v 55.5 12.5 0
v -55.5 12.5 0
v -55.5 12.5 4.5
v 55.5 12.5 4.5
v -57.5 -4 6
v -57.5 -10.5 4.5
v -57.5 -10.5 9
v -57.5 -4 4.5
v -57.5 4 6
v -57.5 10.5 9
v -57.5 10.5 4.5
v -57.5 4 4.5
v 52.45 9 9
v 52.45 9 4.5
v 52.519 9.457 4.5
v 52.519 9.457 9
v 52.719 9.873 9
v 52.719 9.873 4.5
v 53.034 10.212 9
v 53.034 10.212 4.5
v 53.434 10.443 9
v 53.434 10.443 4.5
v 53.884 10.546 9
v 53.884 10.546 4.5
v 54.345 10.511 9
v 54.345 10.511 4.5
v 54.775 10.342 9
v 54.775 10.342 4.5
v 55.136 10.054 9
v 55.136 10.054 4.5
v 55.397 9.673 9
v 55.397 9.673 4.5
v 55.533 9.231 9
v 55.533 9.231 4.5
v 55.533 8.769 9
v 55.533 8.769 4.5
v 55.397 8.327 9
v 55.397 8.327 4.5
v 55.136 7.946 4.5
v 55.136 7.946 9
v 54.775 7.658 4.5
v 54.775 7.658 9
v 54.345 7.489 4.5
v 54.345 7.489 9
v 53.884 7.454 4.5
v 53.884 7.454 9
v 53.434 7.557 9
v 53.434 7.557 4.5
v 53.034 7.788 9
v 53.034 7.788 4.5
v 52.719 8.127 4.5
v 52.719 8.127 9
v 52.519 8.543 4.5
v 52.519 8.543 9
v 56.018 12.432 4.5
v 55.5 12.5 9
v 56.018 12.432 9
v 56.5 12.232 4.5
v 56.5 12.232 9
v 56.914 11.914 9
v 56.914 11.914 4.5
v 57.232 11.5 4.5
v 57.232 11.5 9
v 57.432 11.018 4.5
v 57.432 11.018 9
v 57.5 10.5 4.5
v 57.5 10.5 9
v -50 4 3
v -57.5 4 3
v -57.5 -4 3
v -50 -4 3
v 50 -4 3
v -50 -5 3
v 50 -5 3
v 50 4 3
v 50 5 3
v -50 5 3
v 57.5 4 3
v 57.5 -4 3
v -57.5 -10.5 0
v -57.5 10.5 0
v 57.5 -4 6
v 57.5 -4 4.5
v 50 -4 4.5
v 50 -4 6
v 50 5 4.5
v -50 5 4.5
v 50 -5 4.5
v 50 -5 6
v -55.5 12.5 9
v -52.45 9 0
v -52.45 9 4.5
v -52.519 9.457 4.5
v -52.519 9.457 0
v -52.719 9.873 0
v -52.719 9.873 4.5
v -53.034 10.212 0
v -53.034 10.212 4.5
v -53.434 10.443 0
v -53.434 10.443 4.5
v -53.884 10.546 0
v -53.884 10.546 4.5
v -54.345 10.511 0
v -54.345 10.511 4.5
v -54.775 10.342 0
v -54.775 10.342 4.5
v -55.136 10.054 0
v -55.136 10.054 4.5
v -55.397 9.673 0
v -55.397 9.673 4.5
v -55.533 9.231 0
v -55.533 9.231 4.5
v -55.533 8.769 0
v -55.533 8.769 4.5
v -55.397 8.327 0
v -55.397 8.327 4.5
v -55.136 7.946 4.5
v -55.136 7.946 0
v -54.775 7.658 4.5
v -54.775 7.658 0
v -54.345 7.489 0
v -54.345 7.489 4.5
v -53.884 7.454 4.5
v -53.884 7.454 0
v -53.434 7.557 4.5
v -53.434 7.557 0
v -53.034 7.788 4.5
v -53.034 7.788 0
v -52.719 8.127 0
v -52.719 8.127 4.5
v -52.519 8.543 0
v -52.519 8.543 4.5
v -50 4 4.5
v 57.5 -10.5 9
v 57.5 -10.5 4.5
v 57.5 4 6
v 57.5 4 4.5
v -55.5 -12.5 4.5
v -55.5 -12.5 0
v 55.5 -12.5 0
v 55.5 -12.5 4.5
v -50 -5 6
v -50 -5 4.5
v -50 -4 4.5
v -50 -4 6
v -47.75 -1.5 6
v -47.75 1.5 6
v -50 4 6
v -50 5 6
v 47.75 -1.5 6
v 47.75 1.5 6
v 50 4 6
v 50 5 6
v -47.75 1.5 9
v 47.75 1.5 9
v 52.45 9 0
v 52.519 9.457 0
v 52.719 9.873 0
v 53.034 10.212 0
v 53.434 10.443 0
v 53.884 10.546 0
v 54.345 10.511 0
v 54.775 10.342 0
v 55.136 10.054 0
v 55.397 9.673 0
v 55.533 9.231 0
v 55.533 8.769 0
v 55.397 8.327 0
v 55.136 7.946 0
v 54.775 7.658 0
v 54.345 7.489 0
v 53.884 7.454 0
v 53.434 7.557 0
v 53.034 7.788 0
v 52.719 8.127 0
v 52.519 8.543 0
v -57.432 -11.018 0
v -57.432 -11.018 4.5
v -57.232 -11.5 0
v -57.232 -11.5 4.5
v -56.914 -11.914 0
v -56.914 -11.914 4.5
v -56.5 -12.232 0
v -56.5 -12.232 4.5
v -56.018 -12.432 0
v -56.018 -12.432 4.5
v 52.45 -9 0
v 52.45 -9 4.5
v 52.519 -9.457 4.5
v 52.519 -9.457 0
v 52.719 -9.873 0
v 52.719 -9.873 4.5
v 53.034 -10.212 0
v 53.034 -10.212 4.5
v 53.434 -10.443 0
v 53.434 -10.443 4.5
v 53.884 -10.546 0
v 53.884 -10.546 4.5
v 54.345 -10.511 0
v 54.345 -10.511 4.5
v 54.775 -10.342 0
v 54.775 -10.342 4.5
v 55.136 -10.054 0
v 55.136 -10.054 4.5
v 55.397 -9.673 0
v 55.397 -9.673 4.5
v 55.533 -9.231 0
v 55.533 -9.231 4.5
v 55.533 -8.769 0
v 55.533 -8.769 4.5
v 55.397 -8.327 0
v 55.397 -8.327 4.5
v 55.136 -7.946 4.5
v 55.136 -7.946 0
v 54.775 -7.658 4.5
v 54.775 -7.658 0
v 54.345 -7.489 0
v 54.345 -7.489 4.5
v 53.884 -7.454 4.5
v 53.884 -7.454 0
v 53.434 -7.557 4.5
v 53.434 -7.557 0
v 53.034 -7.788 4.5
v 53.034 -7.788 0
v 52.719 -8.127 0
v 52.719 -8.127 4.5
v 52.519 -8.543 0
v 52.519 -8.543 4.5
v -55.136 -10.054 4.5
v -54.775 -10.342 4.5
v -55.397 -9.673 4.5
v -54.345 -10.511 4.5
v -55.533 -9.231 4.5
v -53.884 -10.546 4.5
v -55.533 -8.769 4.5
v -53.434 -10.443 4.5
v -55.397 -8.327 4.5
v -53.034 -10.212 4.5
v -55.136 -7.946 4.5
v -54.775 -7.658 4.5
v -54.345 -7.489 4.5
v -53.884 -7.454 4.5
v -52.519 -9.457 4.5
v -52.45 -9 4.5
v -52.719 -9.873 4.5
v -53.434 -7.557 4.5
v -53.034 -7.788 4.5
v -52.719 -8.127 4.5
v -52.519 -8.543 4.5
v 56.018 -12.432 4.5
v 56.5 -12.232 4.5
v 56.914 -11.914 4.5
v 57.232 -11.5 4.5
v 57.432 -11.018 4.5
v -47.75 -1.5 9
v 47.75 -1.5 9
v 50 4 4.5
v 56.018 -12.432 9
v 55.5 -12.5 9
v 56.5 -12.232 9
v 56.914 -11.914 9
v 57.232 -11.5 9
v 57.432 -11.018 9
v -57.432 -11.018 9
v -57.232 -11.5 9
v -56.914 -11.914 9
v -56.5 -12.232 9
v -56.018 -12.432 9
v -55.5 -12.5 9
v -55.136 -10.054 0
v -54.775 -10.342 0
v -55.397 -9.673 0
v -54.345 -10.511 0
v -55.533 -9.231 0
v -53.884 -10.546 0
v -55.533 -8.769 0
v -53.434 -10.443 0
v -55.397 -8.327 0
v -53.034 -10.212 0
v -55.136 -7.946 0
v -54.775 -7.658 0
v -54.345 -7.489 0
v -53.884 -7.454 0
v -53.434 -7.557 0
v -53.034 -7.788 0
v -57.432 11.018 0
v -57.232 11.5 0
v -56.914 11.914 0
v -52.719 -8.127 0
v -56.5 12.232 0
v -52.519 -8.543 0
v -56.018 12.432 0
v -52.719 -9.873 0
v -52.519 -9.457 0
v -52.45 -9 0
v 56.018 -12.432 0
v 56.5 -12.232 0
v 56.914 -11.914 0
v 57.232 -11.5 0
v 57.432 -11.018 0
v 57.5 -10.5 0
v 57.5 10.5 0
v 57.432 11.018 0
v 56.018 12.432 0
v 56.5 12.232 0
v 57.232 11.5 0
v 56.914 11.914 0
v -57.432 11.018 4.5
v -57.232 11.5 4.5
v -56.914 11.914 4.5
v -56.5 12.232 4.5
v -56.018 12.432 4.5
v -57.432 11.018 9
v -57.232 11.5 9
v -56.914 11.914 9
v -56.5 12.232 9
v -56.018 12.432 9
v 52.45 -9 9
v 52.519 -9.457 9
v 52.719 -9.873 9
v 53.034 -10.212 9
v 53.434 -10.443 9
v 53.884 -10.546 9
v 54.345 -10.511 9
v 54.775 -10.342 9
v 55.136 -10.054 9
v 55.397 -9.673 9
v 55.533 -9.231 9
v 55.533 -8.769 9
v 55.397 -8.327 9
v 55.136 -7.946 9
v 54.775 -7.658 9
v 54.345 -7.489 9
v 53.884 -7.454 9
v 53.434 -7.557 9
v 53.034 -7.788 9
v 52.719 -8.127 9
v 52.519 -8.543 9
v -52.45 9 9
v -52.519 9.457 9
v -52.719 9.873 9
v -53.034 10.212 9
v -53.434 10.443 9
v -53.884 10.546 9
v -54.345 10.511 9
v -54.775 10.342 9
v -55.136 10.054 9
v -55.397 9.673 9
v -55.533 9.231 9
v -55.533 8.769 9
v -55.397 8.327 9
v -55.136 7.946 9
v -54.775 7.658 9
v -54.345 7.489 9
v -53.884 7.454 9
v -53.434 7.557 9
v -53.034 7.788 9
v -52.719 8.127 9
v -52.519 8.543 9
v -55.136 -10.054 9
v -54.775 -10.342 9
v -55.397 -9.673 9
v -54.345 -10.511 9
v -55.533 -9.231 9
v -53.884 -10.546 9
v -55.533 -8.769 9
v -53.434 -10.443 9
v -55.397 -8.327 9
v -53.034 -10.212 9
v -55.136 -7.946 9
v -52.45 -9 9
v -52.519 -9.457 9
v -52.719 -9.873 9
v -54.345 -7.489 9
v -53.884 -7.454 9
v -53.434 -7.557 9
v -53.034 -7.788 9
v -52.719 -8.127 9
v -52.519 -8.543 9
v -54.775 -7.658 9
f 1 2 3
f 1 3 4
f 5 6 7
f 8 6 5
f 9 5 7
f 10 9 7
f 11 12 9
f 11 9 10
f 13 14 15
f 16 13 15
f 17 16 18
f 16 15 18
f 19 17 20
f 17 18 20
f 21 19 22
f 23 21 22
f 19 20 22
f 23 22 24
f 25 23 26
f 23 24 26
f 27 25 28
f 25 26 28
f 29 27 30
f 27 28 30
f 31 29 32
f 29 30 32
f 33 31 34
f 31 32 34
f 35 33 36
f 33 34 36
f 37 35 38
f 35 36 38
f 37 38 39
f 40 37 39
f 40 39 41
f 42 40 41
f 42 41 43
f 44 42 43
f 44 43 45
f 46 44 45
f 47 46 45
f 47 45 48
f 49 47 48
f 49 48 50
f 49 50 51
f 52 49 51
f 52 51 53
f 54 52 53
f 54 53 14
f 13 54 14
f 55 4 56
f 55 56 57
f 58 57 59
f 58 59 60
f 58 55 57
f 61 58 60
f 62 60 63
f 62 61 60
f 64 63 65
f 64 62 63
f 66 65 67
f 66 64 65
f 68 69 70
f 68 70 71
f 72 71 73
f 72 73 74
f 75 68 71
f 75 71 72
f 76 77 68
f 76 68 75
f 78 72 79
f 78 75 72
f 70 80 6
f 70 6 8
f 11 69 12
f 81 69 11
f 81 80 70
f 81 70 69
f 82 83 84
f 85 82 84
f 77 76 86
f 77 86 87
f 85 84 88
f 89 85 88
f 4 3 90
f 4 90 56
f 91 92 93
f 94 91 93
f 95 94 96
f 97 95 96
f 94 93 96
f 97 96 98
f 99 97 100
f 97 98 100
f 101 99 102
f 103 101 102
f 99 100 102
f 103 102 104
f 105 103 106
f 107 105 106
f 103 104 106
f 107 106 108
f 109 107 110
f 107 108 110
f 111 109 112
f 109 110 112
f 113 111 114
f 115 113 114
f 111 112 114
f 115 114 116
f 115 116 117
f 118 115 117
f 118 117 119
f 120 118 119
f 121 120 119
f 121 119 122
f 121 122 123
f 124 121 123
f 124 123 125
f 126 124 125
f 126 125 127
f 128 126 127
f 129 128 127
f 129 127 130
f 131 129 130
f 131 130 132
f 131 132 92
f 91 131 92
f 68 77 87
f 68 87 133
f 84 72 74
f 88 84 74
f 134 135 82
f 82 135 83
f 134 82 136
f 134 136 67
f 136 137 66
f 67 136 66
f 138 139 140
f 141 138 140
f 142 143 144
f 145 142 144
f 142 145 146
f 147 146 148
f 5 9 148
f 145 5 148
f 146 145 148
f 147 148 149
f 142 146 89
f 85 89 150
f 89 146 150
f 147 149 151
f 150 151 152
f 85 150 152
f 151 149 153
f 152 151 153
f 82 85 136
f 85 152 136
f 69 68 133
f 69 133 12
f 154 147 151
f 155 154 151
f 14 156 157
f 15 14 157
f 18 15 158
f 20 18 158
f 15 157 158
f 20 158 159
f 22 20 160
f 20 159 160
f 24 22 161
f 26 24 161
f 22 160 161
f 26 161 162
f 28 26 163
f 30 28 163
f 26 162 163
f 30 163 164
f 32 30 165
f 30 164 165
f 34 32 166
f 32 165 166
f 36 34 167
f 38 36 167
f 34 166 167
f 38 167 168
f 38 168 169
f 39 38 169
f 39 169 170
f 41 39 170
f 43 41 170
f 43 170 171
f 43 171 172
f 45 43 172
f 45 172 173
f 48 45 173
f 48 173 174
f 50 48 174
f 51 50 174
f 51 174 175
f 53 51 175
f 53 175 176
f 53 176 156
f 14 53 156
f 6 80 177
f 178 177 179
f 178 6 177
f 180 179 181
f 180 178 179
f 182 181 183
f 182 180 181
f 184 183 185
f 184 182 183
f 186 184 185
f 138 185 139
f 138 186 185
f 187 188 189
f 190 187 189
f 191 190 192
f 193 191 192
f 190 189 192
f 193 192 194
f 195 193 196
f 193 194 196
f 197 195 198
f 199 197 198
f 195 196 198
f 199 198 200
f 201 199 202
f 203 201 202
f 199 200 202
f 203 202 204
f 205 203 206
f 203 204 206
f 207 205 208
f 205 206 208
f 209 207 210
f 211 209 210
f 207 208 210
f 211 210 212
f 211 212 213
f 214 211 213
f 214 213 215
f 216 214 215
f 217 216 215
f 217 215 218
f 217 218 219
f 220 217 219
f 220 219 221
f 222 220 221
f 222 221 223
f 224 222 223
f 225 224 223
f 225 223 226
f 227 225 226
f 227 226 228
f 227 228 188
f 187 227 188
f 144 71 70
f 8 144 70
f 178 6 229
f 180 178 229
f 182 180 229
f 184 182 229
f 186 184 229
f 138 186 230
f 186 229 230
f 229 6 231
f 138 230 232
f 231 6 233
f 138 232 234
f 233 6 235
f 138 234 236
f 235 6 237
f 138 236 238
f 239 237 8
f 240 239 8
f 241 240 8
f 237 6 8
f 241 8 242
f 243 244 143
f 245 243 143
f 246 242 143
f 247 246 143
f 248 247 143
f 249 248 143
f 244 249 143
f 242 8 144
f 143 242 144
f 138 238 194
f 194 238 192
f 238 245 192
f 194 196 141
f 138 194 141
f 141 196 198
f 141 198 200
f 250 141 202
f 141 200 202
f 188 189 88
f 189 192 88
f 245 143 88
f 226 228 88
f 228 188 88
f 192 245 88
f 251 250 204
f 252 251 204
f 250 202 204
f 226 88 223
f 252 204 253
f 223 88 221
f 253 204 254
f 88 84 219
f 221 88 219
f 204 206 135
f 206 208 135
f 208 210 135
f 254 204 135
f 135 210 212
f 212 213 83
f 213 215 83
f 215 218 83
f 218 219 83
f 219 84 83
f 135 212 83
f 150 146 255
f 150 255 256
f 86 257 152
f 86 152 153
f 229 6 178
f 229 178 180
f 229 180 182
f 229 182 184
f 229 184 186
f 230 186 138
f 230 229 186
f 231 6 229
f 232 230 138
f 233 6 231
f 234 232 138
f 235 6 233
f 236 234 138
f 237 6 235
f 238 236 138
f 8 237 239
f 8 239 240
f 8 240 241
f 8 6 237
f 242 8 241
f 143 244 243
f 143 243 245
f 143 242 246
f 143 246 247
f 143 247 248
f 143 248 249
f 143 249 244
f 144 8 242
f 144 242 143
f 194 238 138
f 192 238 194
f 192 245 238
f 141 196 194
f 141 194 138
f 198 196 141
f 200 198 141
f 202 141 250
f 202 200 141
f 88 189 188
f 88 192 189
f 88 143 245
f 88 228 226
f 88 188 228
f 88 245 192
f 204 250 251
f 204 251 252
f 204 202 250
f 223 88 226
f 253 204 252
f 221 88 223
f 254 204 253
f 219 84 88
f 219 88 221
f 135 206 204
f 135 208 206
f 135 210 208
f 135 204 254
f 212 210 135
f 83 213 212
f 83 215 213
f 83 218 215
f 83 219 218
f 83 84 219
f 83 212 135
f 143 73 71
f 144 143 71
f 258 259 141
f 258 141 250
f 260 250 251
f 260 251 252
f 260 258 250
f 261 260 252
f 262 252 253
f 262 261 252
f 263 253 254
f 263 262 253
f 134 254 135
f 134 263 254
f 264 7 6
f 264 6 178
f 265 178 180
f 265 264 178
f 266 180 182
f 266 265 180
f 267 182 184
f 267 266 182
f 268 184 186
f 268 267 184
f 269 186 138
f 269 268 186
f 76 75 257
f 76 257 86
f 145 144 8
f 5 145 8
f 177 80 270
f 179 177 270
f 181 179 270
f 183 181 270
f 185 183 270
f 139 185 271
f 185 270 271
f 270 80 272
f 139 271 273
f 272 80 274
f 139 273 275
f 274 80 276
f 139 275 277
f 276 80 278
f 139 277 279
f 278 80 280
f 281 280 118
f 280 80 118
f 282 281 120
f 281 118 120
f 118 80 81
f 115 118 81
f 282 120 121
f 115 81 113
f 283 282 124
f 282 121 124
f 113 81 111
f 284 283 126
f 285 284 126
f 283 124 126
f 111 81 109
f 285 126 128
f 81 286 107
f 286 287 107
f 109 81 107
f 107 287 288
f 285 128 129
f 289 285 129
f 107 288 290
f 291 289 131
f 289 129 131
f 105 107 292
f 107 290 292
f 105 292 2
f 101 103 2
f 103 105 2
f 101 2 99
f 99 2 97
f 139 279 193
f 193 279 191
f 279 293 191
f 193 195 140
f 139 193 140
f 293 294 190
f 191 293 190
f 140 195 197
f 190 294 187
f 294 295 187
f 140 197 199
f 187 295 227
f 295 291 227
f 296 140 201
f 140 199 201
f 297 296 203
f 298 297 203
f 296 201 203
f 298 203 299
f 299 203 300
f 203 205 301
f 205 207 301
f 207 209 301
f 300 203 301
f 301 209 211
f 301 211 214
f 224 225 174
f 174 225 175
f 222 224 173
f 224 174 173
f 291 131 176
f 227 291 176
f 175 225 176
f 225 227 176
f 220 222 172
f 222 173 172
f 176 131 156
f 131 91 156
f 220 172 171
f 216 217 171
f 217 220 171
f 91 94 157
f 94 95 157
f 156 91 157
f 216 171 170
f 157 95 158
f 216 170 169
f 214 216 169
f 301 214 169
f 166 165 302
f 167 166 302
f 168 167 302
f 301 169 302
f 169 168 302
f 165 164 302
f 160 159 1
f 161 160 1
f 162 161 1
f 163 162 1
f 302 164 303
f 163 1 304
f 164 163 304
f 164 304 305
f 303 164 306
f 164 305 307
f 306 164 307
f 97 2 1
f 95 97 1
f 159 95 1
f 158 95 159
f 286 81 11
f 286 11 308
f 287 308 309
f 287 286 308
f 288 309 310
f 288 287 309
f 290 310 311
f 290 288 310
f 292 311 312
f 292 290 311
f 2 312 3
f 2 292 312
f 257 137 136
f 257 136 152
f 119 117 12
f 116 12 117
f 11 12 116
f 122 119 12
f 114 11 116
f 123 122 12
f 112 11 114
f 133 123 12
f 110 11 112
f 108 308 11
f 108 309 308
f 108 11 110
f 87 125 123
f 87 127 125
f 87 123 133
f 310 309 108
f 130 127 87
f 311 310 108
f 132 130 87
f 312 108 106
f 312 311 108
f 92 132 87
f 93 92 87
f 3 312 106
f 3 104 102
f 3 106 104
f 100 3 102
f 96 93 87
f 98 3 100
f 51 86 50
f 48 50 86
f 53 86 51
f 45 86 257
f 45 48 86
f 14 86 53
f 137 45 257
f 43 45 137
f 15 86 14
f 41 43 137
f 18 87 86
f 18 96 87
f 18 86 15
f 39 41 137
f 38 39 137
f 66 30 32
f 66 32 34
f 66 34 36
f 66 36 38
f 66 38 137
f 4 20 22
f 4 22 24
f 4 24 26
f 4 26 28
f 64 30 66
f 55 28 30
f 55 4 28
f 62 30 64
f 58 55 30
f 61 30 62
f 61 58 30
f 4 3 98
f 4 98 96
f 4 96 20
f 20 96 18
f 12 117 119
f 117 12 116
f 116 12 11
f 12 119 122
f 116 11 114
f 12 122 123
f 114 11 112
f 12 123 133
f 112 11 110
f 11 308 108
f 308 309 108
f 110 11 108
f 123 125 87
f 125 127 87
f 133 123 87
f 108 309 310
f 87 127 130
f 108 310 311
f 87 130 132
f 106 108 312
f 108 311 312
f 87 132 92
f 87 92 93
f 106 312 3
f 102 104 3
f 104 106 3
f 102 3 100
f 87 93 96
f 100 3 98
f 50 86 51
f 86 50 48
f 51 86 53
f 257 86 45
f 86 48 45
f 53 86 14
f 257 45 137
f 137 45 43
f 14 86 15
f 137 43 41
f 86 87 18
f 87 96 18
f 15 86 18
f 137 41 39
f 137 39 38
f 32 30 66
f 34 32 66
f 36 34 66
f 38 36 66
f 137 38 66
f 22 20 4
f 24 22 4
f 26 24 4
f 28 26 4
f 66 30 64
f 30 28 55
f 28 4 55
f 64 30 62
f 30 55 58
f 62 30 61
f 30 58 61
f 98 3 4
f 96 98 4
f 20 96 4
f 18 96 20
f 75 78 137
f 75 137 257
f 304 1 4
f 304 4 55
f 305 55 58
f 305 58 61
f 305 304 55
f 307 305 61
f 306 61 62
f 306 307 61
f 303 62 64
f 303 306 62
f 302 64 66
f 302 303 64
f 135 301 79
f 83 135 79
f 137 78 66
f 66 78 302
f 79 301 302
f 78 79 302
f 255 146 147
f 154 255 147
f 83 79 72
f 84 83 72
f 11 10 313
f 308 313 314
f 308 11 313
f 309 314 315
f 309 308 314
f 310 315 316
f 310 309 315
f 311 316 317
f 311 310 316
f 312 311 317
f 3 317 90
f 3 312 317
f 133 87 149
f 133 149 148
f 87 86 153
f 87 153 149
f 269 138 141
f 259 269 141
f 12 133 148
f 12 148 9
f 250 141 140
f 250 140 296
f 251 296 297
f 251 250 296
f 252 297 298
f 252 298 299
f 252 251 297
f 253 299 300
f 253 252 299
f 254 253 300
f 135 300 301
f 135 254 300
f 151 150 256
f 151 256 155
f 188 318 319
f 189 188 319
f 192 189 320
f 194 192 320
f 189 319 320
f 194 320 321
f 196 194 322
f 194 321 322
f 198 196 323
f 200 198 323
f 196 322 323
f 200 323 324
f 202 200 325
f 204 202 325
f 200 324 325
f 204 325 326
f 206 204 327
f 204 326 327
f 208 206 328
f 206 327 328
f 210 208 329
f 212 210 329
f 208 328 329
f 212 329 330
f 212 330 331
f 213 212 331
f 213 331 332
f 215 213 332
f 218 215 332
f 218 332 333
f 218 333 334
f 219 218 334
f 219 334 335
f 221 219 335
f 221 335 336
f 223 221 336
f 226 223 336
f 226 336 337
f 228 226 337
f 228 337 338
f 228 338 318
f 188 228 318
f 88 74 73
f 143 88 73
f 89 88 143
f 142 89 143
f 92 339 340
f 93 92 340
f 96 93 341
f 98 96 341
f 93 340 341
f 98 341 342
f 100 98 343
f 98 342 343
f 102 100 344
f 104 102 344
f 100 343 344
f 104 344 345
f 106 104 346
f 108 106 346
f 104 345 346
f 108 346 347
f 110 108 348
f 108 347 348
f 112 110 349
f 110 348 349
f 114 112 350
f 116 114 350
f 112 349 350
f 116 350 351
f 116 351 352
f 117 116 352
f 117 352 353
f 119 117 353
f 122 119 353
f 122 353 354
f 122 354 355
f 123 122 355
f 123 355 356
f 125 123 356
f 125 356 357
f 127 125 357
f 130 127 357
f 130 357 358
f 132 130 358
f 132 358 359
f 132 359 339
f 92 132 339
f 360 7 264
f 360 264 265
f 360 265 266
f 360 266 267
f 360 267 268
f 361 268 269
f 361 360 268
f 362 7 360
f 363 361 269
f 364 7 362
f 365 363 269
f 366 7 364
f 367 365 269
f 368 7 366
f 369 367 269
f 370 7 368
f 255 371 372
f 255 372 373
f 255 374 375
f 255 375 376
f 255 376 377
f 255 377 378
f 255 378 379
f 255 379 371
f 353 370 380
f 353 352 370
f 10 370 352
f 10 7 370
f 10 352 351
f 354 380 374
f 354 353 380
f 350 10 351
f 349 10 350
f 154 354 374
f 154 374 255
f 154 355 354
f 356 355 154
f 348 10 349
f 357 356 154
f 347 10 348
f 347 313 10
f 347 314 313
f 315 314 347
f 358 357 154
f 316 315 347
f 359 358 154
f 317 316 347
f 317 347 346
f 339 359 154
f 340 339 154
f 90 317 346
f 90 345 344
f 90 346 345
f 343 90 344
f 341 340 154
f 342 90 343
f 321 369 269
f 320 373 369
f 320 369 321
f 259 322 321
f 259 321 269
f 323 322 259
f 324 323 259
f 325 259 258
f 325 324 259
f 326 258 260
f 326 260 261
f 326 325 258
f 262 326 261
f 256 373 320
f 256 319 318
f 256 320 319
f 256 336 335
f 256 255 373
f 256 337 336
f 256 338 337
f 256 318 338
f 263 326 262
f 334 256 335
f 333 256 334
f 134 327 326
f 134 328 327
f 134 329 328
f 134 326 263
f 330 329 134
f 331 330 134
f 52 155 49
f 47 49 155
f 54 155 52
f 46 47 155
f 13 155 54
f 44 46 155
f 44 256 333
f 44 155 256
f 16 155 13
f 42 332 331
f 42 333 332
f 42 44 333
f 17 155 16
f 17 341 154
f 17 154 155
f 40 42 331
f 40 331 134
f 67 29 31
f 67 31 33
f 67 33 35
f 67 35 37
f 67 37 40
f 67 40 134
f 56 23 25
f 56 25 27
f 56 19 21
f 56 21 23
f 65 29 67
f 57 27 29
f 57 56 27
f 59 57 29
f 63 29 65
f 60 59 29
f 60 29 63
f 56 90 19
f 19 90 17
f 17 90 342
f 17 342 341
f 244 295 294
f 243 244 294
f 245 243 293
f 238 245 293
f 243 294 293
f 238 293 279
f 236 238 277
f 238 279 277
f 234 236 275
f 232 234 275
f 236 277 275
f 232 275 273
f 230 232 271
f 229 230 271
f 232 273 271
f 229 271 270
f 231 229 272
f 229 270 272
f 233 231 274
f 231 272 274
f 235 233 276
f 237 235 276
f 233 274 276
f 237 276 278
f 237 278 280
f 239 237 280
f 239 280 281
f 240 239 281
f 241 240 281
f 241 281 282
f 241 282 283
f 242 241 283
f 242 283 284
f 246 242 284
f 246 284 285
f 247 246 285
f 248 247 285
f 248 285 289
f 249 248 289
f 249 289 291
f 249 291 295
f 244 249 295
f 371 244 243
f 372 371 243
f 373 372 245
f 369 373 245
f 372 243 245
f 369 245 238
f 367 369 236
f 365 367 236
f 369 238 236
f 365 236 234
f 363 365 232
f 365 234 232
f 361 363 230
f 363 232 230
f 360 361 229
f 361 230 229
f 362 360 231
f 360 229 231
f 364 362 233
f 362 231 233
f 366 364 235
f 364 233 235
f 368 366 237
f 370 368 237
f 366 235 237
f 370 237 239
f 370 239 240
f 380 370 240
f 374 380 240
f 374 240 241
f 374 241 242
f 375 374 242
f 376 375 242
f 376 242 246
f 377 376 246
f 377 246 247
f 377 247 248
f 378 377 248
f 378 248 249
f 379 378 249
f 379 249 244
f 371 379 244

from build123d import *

# Parameters (mm, degrees)
BOX_BOTTOM_HALF_0_W     = 117
BOX_BOTTOM_HALF_0_H     = 27
BOX_BOTTOM_HALF_0_DEPTH = 5.5
SKETCH_W                = 115
SKETCH_H                = 25
PAD_DEPTH               = 3
PAD001_DEPTH            = 3
SKETCH002_W             = 115
SKETCH002_H             = 25
SKETCH002_W_2           = 95.5
SKETCH002_H_2           = 3
PAD002_DEPTH            = 3
SKETCH003_R             = 1.55
POCKET_DEPTH            = 245.060315
POLARPATTERN_COUNT      = 2
POLARPATTERN001_COUNT   = 2
POLARPATTERN002_COUNT   = 2
FILLET_R                = 2


with BuildPart() as box_bottom_half_0_body:
    # box_bottom_half_0 → box_bottom_half_0 (new body)
    with BuildSketch(Plane(origin=(-58.5, -13.5, -1), x_dir=(1, 0, 0), z_dir=(0, 0, 1))):
        with Locations((58.5, 13.5)):
            Rectangle(BOX_BOTTOM_HALF_0_W, BOX_BOTTOM_HALF_0_H)
    extrude(amount=BOX_BOTTOM_HALF_0_DEPTH)


with BuildPart() as body:
    # Sketch → Pad (new body)
    with BuildSketch(Plane.XY):
        Rectangle(SKETCH_W, SKETCH_H)
    extrude(amount=PAD_DEPTH)

    # Sketch001 (on Face6 of Pad) → Pad001 (join)
    with BuildSketch(Plane.XY.offset(3)):
        Polygon((-57.5, 12.5), (57.5, 12.5), (57.5, 4), (50, 4), (50, 5), (-50, 5), (-50, 4), (-57.5, 4), align=None)
        Polygon((-57.5, -12.5), (57.5, -12.5), (57.5, -4), (50, -4), (50, -5), (-50, -5), (-50, -4), (-57.5, -4), align=None)
    extrude(amount=PAD001_DEPTH)

    # Sketch002 (on Face12 of Pad001) → Pad002 (join)
    with BuildSketch(Plane.XY.offset(6)):
        Rectangle(SKETCH002_W, SKETCH002_H)
        Rectangle(SKETCH002_W_2, SKETCH002_H_2, mode=Mode.SUBTRACT)
    extrude(amount=PAD002_DEPTH)

    # Sketch003 (on Face26 of Pad002) → Pocket (cut, through all)
    with BuildSketch(Plane.XY.offset(9)):
        with Locations((-54, 9)):
            Circle(SKETCH003_R)
    pocket = extrude(amount=-POCKET_DEPTH, mode=Mode.SUBTRACT)

    # PolarPattern: Pocket ×2 about axis
    polarpattern_axis = Axis((0, 0, 0), (0, 1, 0))
    for i in range(1, POLARPATTERN_COUNT):
        add(pocket.rotate(polarpattern_axis, i * 360 / POLARPATTERN_COUNT), mode=Mode.SUBTRACT)

    # PolarPattern001: Pocket ×2 about axis
    polarpattern001_axis = Axis((0, 0, 0), (1, 0, 0))
    for i in range(1, POLARPATTERN001_COUNT):
        add(pocket.rotate(polarpattern001_axis, i * 360 / POLARPATTERN001_COUNT), mode=Mode.SUBTRACT)

    # PolarPattern002: Pocket ×2 about axis
    polarpattern002_axis = Axis((0, 0, 9), (0, 0, 1))
    for i in range(1, POLARPATTERN002_COUNT):
        add(pocket.rotate(polarpattern002_axis, i * 360 / POLARPATTERN002_COUNT), mode=Mode.SUBTRACT)

    # Fillet
    fillet_edges = [body.edges().sort_by_distance(p)[0] for p in [
        (57.5, 12.5, 7.5),
        (57.5, 12.5, 4.5),
        (57.5, 12.5, 1.5),
        (57.5, -12.5, 7.5),
        (-57.5, 12.5, 7.5),
        (-57.5, -12.5, 7.5),
    ]]
    fillet(fillet_edges, radius=FILLET_R)


with BuildPart() as bottom_half_0_body:
    # bottom_half_0 base: copy of Body
    add(body.part)

    # bottom_half_0: intersect box_bottom_half_0 body
    add(box_bottom_half_0_body.part, mode=Mode.INTERSECT)


with BuildPart() as top_half_0_body:
    # top_half_0 base: copy of Body
    add(body.part)

    # top_half_0: cut box_bottom_half_0 body
    add(box_bottom_half_0_body.part, mode=Mode.SUBTRACT)


solid = Compound([bottom_half_0_body.part, top_half_0_body.part])
